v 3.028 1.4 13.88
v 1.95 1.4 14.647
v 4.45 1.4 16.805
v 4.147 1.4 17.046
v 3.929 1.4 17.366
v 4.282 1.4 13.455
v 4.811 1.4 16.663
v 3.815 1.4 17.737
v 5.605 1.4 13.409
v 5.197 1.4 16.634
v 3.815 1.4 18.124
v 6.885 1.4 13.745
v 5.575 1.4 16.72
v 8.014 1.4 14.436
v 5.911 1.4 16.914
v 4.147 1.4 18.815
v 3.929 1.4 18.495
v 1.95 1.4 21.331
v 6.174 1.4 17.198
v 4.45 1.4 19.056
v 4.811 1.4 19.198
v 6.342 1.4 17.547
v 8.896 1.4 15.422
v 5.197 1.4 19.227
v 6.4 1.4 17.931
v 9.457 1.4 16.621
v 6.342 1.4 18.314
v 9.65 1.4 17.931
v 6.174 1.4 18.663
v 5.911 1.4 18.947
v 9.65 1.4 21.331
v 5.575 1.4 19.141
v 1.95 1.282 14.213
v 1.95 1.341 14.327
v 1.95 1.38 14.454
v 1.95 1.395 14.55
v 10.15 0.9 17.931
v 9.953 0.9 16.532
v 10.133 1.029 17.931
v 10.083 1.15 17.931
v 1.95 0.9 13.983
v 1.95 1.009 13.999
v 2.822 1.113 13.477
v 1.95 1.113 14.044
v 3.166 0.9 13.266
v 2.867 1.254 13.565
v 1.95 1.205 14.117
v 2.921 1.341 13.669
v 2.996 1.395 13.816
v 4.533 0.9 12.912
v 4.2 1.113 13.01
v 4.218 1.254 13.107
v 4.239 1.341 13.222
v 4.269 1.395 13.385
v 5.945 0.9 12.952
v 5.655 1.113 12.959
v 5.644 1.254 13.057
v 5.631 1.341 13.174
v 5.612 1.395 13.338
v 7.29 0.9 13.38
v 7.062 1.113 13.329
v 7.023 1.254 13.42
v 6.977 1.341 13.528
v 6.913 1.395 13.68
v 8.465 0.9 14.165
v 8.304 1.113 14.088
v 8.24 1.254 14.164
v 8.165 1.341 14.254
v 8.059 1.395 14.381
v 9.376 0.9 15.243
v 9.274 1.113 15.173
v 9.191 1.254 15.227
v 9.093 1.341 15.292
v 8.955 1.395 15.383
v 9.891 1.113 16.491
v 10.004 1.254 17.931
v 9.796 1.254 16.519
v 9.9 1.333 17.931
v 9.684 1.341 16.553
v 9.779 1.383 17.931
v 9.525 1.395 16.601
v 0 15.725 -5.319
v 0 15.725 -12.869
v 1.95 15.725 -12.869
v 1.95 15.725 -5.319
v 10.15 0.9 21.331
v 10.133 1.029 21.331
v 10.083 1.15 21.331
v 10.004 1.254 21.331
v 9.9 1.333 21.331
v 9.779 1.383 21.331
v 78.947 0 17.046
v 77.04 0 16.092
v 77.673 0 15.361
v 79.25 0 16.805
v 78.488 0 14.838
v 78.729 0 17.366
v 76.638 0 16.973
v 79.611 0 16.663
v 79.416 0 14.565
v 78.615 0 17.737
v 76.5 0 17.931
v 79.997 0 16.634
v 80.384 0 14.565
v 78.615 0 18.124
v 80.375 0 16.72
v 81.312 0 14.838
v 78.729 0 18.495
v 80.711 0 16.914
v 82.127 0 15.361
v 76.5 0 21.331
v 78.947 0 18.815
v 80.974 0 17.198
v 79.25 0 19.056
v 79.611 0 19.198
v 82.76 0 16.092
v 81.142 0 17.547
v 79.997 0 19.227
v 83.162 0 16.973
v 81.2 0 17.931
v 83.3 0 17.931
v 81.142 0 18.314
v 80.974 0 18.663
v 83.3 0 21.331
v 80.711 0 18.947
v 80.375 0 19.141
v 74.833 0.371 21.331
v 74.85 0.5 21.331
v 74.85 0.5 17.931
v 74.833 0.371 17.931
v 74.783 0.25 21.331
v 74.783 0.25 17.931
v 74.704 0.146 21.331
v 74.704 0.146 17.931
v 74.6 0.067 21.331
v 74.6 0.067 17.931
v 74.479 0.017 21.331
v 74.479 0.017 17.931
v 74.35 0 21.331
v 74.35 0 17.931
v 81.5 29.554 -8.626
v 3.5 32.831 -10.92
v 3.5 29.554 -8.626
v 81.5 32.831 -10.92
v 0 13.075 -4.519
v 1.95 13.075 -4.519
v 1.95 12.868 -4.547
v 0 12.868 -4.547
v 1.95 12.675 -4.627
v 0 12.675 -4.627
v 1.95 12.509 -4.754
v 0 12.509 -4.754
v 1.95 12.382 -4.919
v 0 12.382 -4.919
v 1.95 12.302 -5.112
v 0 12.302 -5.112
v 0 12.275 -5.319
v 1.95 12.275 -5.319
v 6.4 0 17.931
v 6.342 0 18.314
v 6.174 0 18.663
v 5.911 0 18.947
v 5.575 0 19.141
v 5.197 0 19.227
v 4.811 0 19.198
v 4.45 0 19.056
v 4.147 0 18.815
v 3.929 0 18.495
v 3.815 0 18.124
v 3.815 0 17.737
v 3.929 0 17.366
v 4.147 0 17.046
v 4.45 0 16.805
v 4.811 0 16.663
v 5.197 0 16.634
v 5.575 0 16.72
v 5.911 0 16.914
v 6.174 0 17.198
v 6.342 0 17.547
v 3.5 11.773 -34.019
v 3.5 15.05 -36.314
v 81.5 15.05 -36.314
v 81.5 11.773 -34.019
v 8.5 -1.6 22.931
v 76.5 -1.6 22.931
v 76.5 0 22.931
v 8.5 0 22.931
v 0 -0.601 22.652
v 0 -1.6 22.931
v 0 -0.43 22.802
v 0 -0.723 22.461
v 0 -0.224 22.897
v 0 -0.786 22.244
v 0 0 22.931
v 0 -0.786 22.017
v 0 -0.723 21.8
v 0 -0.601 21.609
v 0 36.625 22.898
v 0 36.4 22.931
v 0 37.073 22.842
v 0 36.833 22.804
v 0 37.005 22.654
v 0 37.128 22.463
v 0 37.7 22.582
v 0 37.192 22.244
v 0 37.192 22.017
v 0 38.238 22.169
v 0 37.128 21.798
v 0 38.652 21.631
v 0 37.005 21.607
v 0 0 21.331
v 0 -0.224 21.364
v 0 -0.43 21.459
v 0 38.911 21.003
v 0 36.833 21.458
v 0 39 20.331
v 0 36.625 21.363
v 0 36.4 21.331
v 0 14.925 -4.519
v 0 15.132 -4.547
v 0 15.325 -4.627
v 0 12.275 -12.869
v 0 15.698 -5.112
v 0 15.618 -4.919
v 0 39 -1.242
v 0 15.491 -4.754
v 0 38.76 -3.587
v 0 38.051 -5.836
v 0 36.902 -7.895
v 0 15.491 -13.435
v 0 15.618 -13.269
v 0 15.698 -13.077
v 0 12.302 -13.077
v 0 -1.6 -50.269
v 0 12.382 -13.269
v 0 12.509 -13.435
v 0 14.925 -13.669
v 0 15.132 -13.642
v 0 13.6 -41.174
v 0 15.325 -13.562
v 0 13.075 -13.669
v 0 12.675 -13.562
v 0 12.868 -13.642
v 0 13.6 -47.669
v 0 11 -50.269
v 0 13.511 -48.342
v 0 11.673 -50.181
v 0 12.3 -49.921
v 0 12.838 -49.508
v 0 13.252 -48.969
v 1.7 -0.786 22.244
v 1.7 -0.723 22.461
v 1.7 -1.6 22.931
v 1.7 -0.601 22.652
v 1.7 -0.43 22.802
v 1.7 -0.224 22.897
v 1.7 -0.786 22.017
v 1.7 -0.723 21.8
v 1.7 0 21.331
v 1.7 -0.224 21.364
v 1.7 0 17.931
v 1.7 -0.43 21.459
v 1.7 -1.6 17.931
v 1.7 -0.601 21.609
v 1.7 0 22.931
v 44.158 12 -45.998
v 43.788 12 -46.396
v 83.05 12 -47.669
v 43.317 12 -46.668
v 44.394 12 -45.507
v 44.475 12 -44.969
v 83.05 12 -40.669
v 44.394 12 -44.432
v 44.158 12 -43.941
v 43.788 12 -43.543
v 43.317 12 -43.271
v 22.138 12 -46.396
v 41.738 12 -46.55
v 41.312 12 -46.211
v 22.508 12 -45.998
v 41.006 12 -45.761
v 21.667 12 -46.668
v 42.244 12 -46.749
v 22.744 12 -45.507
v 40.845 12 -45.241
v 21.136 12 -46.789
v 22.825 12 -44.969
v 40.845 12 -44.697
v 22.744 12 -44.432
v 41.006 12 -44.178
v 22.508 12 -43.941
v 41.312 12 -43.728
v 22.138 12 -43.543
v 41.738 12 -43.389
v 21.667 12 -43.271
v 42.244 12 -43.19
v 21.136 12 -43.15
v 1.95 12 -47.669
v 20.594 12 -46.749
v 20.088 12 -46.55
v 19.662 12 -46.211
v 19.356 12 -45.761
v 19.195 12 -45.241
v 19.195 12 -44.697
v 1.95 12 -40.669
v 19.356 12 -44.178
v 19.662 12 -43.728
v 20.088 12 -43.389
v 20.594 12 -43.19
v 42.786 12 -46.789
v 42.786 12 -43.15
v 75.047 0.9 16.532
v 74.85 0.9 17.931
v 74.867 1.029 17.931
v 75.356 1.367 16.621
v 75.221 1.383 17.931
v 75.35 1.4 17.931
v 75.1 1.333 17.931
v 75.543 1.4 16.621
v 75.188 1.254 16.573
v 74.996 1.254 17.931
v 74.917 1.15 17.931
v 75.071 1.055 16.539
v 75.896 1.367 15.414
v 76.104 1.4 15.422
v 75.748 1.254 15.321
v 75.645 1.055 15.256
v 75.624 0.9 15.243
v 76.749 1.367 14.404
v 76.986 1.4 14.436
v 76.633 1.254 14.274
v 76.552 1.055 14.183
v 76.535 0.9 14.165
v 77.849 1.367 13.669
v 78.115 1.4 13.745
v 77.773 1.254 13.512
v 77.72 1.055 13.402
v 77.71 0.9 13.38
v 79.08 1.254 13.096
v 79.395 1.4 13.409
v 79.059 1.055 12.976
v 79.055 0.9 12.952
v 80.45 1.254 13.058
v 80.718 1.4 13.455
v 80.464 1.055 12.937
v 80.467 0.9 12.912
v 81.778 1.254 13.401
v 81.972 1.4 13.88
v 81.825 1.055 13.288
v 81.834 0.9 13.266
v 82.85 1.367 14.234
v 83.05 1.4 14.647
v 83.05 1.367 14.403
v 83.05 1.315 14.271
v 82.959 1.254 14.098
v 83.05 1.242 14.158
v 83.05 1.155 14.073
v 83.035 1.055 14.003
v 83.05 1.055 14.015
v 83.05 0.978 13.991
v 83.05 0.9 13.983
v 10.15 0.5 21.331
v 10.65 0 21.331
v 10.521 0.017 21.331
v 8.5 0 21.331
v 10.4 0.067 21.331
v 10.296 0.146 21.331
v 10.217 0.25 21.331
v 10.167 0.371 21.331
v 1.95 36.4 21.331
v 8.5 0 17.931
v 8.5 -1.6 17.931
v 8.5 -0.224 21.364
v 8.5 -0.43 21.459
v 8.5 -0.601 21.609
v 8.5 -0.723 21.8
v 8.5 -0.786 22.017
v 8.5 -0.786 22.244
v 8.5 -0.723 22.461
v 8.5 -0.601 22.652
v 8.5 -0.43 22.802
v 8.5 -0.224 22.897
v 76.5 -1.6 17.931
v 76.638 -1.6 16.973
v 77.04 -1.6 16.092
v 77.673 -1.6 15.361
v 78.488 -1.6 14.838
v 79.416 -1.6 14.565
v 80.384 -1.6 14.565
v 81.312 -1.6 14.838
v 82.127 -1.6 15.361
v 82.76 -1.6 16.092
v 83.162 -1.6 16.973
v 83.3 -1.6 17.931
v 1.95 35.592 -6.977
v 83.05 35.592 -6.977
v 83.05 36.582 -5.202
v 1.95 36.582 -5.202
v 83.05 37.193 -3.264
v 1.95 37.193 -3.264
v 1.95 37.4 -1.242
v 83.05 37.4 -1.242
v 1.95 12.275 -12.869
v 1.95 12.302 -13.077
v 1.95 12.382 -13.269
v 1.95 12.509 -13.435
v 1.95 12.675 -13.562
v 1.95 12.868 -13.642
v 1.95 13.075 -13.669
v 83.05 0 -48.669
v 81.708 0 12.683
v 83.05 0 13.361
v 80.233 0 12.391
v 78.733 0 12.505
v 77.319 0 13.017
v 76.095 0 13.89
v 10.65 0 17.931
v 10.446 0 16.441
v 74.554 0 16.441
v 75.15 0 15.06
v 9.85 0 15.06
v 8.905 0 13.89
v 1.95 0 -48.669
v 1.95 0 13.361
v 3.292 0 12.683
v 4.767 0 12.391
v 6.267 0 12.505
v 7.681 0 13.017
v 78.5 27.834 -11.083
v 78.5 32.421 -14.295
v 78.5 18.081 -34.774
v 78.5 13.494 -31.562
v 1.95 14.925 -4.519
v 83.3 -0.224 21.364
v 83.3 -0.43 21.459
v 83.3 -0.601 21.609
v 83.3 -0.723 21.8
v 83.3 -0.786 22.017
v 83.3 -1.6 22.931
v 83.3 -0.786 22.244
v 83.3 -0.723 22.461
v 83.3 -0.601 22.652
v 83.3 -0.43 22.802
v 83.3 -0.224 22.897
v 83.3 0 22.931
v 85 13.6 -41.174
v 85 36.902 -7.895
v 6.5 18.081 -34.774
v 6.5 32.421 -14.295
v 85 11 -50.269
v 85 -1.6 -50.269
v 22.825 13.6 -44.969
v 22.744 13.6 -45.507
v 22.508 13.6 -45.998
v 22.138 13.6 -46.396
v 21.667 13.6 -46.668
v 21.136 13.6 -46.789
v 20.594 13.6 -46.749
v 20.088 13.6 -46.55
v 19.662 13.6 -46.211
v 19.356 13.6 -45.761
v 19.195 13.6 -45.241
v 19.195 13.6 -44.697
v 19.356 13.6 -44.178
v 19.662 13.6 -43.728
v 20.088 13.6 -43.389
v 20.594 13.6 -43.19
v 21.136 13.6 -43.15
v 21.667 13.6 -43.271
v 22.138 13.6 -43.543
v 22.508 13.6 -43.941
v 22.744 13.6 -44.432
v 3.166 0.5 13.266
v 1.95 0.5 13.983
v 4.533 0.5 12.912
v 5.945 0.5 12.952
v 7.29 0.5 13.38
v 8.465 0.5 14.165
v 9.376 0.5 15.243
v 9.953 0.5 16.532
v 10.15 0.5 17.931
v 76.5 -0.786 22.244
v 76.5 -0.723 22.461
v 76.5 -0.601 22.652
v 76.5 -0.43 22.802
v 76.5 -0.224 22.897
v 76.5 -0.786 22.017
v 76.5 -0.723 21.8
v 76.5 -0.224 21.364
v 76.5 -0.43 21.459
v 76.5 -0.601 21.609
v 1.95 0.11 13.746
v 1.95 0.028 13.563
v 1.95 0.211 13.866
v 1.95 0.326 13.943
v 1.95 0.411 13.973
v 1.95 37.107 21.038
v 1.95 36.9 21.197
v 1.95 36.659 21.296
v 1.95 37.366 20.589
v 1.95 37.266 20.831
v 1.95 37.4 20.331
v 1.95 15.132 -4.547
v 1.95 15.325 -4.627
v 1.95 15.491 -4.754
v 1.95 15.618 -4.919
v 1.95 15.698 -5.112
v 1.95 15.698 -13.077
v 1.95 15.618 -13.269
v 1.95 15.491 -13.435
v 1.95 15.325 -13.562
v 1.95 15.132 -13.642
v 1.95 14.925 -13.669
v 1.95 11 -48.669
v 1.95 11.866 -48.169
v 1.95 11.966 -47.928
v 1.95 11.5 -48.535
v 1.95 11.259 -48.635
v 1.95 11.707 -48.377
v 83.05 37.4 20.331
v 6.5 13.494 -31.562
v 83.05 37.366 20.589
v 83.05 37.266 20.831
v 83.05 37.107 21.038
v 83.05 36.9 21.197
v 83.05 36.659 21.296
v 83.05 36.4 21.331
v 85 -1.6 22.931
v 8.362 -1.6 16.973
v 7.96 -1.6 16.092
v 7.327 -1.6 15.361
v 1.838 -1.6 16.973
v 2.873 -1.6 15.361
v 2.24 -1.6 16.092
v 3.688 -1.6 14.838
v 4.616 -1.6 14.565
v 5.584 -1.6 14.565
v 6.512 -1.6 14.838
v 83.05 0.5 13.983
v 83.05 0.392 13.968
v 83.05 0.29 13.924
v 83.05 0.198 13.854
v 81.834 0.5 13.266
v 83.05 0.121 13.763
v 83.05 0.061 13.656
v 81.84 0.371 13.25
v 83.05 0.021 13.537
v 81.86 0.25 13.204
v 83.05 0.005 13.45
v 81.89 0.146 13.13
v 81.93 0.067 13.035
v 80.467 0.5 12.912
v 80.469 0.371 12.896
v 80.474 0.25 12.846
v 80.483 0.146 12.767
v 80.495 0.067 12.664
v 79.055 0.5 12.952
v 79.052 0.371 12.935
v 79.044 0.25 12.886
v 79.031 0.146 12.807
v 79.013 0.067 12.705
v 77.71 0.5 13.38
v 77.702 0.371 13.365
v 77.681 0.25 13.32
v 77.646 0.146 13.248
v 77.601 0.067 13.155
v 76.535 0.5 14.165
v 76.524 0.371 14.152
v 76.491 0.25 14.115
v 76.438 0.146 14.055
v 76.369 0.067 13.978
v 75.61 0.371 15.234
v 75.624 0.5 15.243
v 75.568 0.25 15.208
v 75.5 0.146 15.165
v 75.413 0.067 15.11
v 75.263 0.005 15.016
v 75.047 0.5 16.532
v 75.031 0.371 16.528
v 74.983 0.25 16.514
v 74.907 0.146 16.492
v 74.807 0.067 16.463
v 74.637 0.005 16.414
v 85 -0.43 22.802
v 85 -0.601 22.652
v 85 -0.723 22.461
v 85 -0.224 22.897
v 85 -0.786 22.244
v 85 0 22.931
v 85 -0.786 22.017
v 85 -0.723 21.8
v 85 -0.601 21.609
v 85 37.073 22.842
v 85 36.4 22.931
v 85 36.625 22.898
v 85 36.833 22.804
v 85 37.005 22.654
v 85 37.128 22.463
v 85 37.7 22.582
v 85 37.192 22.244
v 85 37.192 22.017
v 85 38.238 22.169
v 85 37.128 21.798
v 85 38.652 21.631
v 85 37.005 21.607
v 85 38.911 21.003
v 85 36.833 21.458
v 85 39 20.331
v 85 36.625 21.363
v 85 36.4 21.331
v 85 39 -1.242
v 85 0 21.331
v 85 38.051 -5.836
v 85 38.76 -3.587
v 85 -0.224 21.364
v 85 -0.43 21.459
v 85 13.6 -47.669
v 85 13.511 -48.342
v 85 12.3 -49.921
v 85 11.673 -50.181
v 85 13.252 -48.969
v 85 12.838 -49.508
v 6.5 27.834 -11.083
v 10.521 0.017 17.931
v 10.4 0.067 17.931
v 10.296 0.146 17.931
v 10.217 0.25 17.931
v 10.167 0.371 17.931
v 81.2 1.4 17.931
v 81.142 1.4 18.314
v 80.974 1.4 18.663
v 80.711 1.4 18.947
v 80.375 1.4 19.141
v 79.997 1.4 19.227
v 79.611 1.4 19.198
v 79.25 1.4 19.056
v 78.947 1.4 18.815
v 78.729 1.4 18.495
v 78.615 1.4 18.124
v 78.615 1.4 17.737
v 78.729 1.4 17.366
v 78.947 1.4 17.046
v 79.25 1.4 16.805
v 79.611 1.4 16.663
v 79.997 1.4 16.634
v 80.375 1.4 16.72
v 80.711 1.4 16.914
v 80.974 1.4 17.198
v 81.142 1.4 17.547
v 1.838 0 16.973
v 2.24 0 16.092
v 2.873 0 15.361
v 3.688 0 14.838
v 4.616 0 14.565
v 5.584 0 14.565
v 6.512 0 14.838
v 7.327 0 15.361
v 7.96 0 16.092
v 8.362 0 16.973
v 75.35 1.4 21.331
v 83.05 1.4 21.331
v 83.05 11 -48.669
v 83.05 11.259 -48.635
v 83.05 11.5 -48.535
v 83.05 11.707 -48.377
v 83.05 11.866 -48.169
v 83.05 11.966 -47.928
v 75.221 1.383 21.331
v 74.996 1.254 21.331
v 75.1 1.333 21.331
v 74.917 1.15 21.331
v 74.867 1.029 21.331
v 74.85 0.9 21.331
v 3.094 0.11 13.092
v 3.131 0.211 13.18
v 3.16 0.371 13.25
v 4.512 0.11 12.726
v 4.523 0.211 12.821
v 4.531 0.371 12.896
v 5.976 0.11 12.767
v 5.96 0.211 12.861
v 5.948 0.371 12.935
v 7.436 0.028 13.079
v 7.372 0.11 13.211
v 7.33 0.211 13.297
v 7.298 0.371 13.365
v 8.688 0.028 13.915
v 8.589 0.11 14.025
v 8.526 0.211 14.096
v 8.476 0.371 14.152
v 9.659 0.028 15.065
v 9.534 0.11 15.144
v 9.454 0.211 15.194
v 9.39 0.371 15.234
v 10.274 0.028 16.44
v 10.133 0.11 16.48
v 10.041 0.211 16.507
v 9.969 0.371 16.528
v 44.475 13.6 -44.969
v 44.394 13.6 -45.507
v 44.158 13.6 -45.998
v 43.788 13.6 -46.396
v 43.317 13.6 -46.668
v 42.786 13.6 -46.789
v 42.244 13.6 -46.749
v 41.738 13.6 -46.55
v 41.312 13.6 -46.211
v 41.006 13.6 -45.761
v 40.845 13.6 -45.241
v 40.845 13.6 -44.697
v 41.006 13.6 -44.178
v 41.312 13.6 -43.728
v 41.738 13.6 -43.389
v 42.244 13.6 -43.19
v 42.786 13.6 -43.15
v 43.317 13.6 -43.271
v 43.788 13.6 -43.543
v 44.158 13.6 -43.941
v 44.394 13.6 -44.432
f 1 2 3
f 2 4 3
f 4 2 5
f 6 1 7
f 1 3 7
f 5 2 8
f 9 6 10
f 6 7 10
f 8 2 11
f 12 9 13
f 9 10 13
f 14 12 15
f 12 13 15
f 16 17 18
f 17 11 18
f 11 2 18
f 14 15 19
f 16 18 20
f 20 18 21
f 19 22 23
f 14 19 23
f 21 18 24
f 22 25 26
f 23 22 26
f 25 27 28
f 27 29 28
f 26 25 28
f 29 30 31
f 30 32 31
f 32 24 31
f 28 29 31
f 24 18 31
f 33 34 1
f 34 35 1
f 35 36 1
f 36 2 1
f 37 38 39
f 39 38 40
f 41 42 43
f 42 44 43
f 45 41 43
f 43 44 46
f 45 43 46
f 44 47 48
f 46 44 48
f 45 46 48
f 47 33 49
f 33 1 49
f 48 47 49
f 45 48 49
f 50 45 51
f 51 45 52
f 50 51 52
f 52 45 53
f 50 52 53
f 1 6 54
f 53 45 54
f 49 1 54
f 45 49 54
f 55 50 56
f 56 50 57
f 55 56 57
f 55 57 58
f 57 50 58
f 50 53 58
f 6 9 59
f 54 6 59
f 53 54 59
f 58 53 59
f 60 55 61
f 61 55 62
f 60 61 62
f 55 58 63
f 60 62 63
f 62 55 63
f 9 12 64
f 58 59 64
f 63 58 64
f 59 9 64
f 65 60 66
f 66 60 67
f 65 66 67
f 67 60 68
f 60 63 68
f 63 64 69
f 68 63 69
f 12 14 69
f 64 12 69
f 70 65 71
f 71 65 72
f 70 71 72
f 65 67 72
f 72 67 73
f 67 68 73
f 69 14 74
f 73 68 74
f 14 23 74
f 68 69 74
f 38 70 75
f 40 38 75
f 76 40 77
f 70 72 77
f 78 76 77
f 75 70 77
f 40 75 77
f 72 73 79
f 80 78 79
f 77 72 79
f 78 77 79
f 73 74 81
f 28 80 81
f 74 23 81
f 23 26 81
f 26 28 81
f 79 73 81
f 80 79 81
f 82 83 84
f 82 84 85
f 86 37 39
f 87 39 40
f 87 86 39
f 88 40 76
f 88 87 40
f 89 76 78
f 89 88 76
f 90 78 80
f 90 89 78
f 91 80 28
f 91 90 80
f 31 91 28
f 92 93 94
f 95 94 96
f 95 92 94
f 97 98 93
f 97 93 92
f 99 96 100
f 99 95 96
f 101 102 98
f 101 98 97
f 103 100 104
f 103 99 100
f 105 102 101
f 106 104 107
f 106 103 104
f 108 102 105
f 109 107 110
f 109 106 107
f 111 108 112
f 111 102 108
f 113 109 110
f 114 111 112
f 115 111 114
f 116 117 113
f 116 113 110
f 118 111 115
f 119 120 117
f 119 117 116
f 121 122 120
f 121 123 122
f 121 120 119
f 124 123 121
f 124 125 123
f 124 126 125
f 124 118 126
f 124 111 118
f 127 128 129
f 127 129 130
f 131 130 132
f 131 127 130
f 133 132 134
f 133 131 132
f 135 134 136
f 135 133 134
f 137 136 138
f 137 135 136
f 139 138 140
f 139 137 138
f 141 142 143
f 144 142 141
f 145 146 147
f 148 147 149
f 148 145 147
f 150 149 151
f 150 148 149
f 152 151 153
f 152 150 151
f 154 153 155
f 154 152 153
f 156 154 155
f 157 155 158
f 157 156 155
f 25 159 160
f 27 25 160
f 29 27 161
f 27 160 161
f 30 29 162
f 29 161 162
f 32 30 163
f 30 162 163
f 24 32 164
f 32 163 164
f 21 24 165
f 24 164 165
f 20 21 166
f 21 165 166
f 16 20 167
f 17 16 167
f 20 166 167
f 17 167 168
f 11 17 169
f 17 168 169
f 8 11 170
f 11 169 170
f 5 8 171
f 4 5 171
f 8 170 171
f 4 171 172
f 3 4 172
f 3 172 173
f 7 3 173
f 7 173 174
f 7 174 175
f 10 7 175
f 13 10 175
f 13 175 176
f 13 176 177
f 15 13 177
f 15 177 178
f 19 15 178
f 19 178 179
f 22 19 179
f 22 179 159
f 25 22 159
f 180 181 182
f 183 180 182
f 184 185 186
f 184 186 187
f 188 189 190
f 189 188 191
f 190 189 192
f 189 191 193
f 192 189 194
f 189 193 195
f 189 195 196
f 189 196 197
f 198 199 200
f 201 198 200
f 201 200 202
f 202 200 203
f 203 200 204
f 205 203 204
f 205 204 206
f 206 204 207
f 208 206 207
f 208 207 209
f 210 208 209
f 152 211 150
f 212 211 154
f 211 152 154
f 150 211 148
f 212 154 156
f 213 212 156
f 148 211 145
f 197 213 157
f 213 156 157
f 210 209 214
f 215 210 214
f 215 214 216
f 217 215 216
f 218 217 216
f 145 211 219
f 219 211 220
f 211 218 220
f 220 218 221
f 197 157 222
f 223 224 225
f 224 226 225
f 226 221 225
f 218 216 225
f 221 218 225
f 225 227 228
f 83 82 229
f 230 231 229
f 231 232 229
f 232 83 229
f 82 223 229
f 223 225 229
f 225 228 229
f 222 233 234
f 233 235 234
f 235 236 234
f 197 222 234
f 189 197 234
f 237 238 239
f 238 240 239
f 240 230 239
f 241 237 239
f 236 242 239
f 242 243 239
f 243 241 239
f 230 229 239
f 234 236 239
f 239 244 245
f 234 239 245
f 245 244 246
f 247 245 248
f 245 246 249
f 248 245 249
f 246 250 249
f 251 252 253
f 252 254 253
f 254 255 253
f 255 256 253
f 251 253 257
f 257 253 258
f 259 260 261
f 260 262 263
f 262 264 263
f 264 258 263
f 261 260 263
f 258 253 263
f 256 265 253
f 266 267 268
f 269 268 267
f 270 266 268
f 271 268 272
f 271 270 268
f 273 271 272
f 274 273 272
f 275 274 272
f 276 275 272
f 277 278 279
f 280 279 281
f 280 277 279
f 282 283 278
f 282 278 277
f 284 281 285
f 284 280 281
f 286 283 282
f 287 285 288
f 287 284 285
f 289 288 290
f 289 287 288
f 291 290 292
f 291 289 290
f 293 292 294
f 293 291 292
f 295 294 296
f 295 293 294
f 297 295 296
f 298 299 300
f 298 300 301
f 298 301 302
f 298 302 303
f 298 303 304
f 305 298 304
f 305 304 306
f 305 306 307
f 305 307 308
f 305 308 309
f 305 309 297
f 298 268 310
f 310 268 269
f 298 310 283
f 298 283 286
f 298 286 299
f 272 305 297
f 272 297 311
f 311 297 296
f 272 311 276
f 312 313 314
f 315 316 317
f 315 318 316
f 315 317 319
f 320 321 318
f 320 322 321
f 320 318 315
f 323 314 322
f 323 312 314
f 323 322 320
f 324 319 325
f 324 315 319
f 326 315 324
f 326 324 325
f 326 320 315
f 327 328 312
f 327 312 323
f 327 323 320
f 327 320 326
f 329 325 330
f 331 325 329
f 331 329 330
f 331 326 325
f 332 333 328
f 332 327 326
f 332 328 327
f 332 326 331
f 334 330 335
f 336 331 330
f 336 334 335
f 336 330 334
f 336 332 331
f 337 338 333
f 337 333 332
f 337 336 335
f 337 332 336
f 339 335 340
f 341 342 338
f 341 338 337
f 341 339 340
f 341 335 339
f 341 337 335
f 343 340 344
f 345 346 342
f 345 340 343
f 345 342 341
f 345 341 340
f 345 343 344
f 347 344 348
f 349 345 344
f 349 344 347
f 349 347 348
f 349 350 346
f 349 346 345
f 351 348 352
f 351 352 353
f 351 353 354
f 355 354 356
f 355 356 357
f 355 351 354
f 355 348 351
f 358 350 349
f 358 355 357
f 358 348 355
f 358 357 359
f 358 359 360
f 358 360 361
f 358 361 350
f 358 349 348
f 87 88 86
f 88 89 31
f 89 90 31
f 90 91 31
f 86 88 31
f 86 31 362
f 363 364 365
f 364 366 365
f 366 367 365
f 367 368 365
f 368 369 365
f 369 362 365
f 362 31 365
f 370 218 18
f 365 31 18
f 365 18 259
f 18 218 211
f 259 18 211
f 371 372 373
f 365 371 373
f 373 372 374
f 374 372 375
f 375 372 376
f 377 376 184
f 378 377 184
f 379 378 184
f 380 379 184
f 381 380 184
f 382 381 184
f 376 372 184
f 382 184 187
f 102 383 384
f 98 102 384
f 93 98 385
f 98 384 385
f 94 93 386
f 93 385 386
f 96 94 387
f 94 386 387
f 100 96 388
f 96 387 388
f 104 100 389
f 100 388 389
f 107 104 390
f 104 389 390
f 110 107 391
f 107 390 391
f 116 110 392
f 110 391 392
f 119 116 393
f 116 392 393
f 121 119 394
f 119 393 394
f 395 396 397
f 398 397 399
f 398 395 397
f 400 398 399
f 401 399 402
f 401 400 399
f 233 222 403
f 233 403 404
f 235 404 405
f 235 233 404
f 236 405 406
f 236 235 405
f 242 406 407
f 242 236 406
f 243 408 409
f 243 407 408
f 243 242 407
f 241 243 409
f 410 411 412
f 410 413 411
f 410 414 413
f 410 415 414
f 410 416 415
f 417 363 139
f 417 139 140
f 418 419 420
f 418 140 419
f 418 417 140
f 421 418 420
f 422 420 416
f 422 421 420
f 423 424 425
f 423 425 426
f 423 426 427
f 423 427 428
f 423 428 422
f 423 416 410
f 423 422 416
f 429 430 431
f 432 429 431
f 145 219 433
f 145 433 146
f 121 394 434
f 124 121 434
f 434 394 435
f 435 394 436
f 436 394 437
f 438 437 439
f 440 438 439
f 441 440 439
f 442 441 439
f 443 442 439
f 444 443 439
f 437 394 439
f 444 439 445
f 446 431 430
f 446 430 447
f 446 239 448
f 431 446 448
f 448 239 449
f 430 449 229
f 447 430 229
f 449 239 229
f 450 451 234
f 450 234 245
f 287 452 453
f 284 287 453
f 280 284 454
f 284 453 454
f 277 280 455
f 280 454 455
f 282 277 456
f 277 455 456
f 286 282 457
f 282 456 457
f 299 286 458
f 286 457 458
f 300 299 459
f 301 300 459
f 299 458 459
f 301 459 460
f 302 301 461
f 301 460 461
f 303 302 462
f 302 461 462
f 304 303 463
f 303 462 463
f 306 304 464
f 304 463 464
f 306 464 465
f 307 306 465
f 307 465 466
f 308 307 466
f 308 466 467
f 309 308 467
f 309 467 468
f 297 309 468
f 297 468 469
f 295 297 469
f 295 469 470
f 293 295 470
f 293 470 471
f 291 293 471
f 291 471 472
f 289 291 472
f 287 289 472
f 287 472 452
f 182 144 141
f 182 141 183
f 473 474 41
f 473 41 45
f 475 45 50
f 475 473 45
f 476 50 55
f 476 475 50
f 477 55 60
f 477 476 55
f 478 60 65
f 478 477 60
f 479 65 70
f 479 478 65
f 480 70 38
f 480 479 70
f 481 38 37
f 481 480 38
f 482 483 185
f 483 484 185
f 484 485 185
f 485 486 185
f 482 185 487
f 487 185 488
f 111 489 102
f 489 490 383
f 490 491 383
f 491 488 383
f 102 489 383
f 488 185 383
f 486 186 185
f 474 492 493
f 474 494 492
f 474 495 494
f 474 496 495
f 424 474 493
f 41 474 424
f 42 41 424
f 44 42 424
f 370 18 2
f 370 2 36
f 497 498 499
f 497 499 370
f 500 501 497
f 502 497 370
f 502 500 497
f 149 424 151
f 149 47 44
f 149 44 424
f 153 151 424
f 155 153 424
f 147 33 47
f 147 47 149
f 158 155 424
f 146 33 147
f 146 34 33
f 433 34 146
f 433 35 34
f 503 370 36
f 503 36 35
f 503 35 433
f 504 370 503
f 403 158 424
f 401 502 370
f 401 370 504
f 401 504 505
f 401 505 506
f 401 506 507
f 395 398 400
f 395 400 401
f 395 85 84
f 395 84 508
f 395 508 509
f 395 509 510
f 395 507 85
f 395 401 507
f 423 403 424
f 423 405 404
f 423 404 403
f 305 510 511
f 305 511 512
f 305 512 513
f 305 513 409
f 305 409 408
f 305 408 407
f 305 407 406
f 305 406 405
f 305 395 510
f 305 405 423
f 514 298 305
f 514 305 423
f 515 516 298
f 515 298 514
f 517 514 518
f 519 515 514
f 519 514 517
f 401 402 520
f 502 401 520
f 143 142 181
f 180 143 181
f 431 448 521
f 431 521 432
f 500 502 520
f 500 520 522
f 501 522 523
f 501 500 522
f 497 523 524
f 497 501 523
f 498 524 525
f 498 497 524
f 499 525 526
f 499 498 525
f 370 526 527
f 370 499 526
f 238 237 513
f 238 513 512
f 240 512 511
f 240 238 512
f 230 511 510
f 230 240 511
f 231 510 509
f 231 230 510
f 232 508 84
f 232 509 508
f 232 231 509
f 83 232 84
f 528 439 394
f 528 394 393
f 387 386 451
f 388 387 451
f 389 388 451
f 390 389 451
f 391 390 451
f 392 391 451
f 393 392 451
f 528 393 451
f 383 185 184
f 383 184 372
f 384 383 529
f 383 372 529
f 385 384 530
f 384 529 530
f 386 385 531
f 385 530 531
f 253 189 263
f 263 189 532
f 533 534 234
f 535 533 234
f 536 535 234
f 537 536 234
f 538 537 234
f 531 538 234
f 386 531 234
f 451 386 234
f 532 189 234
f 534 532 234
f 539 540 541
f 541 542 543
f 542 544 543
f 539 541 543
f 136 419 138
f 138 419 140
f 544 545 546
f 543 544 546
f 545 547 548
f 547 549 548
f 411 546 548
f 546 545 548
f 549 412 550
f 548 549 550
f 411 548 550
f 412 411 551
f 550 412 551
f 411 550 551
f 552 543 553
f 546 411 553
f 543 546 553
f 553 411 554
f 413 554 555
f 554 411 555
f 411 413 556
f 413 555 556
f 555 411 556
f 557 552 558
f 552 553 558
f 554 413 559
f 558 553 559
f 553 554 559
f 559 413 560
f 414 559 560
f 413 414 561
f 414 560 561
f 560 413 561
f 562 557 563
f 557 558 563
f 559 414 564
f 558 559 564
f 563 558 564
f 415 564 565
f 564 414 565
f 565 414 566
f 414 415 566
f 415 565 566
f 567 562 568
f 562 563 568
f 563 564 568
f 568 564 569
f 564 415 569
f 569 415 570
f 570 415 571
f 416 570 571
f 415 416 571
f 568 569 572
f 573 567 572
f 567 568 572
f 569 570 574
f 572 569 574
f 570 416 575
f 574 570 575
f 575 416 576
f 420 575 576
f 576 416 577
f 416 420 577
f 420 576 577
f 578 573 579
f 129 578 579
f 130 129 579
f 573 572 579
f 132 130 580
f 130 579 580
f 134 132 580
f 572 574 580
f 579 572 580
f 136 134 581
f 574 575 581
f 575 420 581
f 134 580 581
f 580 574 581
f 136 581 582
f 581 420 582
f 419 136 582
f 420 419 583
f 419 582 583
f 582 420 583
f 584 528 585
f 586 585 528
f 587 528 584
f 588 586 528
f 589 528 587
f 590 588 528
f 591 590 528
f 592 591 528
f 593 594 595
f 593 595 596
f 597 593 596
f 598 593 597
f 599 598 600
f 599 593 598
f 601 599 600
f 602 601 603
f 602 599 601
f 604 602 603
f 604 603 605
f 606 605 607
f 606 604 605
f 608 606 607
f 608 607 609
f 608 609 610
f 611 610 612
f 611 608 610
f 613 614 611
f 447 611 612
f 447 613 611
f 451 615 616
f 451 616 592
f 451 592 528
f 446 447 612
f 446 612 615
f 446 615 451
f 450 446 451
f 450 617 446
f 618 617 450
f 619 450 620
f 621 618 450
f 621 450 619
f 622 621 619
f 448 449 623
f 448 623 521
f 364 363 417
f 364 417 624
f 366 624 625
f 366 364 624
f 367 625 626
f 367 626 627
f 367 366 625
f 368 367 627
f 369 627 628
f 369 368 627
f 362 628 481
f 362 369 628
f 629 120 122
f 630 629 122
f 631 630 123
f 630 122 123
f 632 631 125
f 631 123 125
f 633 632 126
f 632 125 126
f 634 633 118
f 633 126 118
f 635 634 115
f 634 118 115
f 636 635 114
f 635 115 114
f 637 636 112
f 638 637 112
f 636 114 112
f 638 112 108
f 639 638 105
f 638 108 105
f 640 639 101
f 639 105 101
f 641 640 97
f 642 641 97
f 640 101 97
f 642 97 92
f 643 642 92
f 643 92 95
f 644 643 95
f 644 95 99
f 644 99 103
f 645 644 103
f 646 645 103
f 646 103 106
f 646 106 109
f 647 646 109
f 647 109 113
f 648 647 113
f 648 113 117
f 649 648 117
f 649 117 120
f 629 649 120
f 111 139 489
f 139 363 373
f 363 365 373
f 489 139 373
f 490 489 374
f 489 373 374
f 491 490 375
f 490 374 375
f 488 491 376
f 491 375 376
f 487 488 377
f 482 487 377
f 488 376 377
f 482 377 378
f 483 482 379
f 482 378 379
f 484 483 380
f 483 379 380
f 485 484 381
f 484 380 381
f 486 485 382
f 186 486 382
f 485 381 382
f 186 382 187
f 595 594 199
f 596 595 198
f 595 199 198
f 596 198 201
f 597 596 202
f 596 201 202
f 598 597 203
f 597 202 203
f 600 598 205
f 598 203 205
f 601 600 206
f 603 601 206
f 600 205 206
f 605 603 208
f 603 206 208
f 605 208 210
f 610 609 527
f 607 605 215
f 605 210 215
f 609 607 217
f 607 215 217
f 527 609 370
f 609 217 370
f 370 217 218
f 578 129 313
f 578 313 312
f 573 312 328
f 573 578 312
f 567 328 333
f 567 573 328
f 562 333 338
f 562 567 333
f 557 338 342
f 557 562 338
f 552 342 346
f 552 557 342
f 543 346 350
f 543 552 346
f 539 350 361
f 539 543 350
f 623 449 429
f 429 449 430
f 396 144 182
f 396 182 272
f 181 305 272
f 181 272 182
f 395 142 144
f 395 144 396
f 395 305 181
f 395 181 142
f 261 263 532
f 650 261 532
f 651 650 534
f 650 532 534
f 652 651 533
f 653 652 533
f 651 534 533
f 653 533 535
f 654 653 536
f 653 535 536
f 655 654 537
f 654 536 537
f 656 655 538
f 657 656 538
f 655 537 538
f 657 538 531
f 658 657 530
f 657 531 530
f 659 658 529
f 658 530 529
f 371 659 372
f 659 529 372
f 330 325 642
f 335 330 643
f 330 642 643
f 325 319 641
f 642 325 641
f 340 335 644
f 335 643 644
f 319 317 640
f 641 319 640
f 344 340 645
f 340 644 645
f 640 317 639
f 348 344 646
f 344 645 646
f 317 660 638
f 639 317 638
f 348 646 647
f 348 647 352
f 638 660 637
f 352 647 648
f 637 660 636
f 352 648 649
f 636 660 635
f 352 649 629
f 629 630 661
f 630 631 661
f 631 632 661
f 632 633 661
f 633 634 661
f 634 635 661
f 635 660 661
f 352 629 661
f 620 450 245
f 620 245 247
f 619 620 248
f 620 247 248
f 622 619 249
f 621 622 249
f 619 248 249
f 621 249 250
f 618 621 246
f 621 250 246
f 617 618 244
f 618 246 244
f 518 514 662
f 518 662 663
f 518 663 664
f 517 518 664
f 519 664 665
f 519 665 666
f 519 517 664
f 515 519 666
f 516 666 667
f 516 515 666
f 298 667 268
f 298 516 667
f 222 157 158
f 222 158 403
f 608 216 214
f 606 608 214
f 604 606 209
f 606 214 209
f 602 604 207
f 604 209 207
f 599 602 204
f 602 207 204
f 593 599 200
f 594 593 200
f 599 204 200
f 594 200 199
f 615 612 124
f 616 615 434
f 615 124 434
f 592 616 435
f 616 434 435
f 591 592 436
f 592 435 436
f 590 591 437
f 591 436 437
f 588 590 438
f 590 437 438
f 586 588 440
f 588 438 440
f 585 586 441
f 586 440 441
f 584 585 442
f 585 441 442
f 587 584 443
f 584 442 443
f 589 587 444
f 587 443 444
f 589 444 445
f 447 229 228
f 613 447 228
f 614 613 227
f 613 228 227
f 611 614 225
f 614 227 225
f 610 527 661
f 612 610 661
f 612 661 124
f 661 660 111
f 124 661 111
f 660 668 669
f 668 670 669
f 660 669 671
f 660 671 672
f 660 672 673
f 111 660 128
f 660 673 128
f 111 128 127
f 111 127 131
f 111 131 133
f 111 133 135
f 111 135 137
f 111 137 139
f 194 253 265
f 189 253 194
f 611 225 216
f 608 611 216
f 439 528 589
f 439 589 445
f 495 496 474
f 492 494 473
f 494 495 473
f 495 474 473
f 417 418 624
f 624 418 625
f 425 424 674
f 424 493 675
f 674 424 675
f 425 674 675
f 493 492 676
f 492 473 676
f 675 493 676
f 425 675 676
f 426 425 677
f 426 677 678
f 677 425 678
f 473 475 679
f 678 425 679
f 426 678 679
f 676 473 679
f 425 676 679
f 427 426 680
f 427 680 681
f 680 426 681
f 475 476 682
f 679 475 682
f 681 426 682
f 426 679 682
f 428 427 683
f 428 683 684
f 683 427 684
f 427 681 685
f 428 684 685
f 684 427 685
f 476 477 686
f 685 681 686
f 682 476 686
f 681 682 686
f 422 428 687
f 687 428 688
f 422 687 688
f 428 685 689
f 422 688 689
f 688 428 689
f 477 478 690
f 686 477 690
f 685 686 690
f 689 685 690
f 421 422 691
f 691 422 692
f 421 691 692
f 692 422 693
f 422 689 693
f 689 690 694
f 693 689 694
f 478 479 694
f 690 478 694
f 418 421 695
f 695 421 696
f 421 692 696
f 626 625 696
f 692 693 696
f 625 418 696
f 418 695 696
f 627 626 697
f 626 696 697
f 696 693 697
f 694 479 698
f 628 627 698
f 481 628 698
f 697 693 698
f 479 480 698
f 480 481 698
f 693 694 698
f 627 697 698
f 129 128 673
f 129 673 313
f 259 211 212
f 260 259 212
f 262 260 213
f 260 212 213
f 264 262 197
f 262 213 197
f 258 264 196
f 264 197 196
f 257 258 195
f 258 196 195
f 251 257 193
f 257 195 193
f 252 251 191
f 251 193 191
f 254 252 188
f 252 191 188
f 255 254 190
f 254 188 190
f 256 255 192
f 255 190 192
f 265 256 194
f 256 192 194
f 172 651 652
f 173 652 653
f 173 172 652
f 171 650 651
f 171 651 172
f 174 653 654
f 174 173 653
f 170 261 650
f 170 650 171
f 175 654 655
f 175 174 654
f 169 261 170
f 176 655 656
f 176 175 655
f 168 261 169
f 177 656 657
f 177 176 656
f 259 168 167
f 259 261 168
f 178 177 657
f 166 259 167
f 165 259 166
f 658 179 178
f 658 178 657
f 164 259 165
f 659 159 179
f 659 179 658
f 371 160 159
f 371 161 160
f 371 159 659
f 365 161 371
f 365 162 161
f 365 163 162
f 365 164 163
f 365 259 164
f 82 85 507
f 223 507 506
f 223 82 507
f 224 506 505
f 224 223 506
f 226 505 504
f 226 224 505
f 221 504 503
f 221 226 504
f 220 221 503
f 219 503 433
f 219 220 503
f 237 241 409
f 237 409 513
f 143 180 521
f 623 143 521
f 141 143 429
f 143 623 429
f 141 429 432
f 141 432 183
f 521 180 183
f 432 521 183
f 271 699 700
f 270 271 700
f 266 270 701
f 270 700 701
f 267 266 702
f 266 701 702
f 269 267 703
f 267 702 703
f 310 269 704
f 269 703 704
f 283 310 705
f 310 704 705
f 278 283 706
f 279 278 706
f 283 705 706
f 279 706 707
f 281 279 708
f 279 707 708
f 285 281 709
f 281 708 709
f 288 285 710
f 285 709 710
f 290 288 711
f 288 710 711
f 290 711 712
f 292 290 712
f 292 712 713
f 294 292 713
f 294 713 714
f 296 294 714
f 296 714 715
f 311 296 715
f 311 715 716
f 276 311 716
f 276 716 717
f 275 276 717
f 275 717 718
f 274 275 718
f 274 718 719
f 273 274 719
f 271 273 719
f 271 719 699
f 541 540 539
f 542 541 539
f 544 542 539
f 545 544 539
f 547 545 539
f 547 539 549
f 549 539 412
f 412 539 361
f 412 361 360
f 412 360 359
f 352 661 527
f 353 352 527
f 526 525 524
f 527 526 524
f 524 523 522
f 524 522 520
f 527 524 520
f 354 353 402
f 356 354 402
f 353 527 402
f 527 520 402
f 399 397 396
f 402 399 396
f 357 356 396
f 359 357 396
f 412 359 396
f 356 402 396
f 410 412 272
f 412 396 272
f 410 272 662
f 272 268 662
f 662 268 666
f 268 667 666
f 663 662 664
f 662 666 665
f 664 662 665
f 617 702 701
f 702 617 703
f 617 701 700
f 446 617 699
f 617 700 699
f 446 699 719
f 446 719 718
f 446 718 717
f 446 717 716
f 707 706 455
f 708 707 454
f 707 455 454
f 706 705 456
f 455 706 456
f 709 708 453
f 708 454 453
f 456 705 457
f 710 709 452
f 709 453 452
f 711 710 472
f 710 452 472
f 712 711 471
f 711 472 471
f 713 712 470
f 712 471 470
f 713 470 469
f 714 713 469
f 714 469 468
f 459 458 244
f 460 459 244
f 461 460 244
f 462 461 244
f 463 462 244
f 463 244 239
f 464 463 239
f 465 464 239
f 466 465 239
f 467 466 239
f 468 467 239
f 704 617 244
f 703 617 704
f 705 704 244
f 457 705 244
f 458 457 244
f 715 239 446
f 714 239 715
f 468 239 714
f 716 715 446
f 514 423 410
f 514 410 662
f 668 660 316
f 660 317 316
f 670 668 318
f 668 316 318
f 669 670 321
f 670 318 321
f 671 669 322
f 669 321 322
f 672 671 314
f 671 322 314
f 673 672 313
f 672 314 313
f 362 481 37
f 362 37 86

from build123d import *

# Parameters (mm, degrees)
BOSS_EXTRUDE1_DEPTH = 85
CUT_EXTRUDE1_START  = 1.95
CUT_EXTRUDE1_DEPTH  = 81.1
CUT_EXTRUDE5_REACH  = 51.22
SKETCH5_W           = 72
SKETCH5_H           = 25
SKETCH5_3_W         = 78
SKETCH5_3_H         = 31
SKETCH5_3_W_2       = 72
SKETCH5_3_H_2       = 25
BOSS_EXTRUDE3_DEPTH = 5.6
SKETCH6_R           = 1.825
CUT_EXTRUDE6_DEPTH  = 13.6
CUT_EXTRUDE7_REACH  = 87
SKETCH12_R          = 1.5
CUT_EXTRUDE10_DEPTH = 1.6
SKETCH12_5_R        = 1.5
SKETCH12_5_R_2      = 1.3
BOSS_EXTRUDE7_DEPTH = 3
SKETCH12_6_R        = 1.5
SKETCH12_6_R_2      = 1.3
CUT_EXTRUDE11_DEPTH = 1.6
CUT_EXTRUDE8_REACH  = 87
FILLET2_R           = 0.5


with BuildPart() as part:
    # Sketch1 → Boss-Extrude1 (new body)
    with BuildSketch(Plane(origin=(0, 0, 0), x_dir=(0, 0, -1), z_dir=(1, 0, 0))):
        with BuildLine():
            Line((-22.930528586, 36.4), (-22.930528586, -1.6))
            Line((-22.930528586, -1.6), (50.269471414, -1.6))
            Line((50.269471414, -1.6), (50.269471414, 11))
            ThreePointArc((50.269471414, 11), (49.507949045, 12.838477631), (47.669471414, 13.6))
            Line((47.669471414, 13.6), (41.173949476, 13.6))
            Line((41.173949476, 13.6), (7.895010815, 36.902163714))
            ThreePointArc((7.895010815, 36.902163714), (4.729711428, 38.463116629), (1.241524153, 39))
            Line((1.241524153, 39), (-20.330528586, 39))
            ThreePointArc((-20.330528586, 39), (-22.169006218, 38.238477631), (-22.930528586, 36.4))
        make_face()
    extrude(amount=BOSS_EXTRUDE1_DEPTH)

    # Sketch1_3 → Cut-Extrude1 (cut)
    with BuildSketch(Plane(origin=(0, 0, 0), x_dir=(0, 0, -1), z_dir=(1, 0, 0)).offset(CUT_EXTRUDE1_START)):
        with BuildLine():
            Line((48.669471414, 0), (48.669471414, 11))
            ThreePointArc((48.669471414, 11), (48.376578195, 11.707106781), (47.669471414, 12))
            Line((47.669471414, 12), (40.669471414, 12))
            Line((40.669471414, 12), (6.977288517, 35.591520443))
            ThreePointArc((6.977288517, 35.591520443), (4.248582149, 36.937169507), (1.241524153, 37.4))
            Line((1.241524153, 37.4), (-20.330528586, 37.4))
            ThreePointArc((-20.330528586, 37.4), (-21.037635368, 37.107106781), (-21.330528586, 36.4))
            Line((-21.330528586, 36.4), (-21.330528586, 0))
            Line((-21.330528586, 0), (48.669471414, 0))
        make_face()
    extrude(amount=CUT_EXTRUDE1_DEPTH, mode=Mode.SUBTRACT)

    # Sketch5 → Cut-Extrude5 (cut, up to next)
    with BuildSketch(Plane(origin=(0, 28.47116522, -19.935724509), x_dir=(1, 0, 0), z_dir=(0, 0.819152044, -0.573576436)), mode=Mode.PRIVATE) as cut_extrude5_sk1:
        with Locations((42.5, 5.614044021)):
            Rectangle(SKETCH5_W, SKETCH5_H)
    cut_extrude5_tool1 = extrude(cut_extrude5_sk1.sketch, amount=-CUT_EXTRUDE5_REACH, mode=Mode.PRIVATE) & part.part
    add(cut_extrude5_tool1.solids().sort_by_distance((42.5, 25.251082, -24.53448))[0], mode=Mode.SUBTRACT)

    # Sketch5_3 → Boss-Extrude3 (add)
    with BuildSketch(Plane(origin=(0, 28.47116522, -19.935724509), x_dir=(1, 0, 0), z_dir=(0, 0.819152044, -0.573576436))):
        with Locations((42.5, 5.614044021)):
            Rectangle(SKETCH5_3_W, SKETCH5_3_H)
        with Locations((42.5, 5.614044021)):
            Rectangle(SKETCH5_3_W_2, SKETCH5_3_H_2, mode=Mode.SUBTRACT)
    extrude(amount=-BOSS_EXTRUDE3_DEPTH)

    # Sketch6 → Cut-Extrude6 (cut)
    with BuildSketch(Plane(origin=(0, 13.6, 0), x_dir=(1, 0, 0), z_dir=(0, 1, 0))):
        with Locations((21, 44.969471414)):
            Circle(SKETCH6_R)
        with Locations((42.65, 44.969471414)):
            Circle(SKETCH6_R)
    extrude(amount=-CUT_EXTRUDE6_DEPTH, mode=Mode.SUBTRACT)

    # Sketch7 → Cut-Extrude7 (cut, up to next)
    with BuildSketch(Plane.ZY, mode=Mode.PRIVATE) as cut_extrude7_sk1:
        with BuildLine():
            Line((-12.869471414, 15.725), (-5.319471414, 15.725))
            ThreePointArc((-5.319471414, 15.725), (-4.753785989, 15.490685425), (-4.519471414, 14.925))
            Line((-4.519471414, 14.925), (-4.519471414, 13.075))
            ThreePointArc((-4.519471414, 13.075), (-4.753785989, 12.509314575), (-5.319471414, 12.275))
            Line((-5.319471414, 12.275), (-12.869471414, 12.275))
            ThreePointArc((-12.869471414, 12.275), (-13.435156838, 12.509314575), (-13.669471414, 13.075))
            Line((-13.669471414, 13.075), (-13.669471414, 14.925))
            ThreePointArc((-13.669471414, 14.925), (-13.435156838, 15.490685425), (-12.869471414, 15.725))
        make_face()
    cut_extrude7_tool1 = extrude(cut_extrude7_sk1.sketch, amount=-CUT_EXTRUDE7_REACH, mode=Mode.PRIVATE) & part.part
    add(cut_extrude7_tool1.solids().sort_by_distance((0, 14, -9.094471))[0], mode=Mode.SUBTRACT)

    # Sketch12 → Cut-Extrude10 (cut)
    with BuildSketch(Plane.XZ.offset(1.6)):
        with Locations((79.9, 17.930528586)):
            Circle(SKETCH12_R)
        with Locations((5.1, 17.930528586)):
            Circle(SKETCH12_R)
    extrude(amount=-CUT_EXTRUDE10_DEPTH, mode=Mode.SUBTRACT)

    # Sketch12_5 → Boss-Extrude7 (add)
    with BuildSketch(Plane.XZ.offset(1.6)):
        with BuildLine():
            ThreePointArc((83.3, 17.930528586), (79.9, 14.530528586), (76.5, 17.930528586))
            Line((76.5, 17.930528586), (76.5, 22.930528586))
            Line((76.5, 22.930528586), (74.85, 22.930528586))
            Line((74.85, 22.930528586), (74.85, 17.930528586))
            ThreePointArc((74.85, 17.930528586), (79.9, 12.880528586), (84.95, 17.930528586))
            Line((84.95, 17.930528586), (84.95, 22.930528586))
            Line((84.95, 22.930528586), (83.3, 22.930528586))
            Line((83.3, 22.930528586), (83.3, 17.930528586))
        make_face()
        with BuildLine():
            Line((76.5, 22.930528586), (76.5, 17.930528586))
            ThreePointArc((76.5, 17.930528586), (79.9, 14.530528586), (83.3, 17.930528586))
            Line((83.3, 17.930528586), (83.3, 22.930528586))
            Line((83.3, 22.930528586), (76.5, 22.930528586))
        make_face()
        with Locations((79.9, 17.930528586)):
            Circle(SKETCH12_5_R, mode=Mode.SUBTRACT)
        with Locations((79.9, 17.930528586)):
            Circle(SKETCH12_5_R)
        with Locations((79.9, 17.930528586)):
            Circle(SKETCH12_5_R_2, mode=Mode.SUBTRACT)
        with BuildLine():
            Line((10.15, 17.930528586), (10.15, 22.930528586))
            Line((10.15, 22.930528586), (8.5, 22.930528586))
            Line((8.5, 22.930528586), (8.5, 17.930528586))
            ThreePointArc((8.5, 17.930528586), (5.1, 14.530528586), (1.7, 17.930528586))
            Line((1.7, 17.930528586), (1.7, 22.930528586))
            Line((1.7, 22.930528586), (0.05, 22.930528586))
            Line((0.05, 22.930528586), (0.05, 17.930528586))
            ThreePointArc((0.05, 17.930528586), (5.1, 12.880528586), (10.15, 17.930528586))
        make_face()
        with BuildLine():
            Line((8.5, 17.930528586), (8.5, 22.930528586))
            Line((8.5, 22.930528586), (1.7, 22.930528586))
            Line((1.7, 22.930528586), (1.7, 17.930528586))
            ThreePointArc((1.7, 17.930528586), (5.1, 14.530528586), (8.5, 17.930528586))
        make_face()
        with Locations((5.1, 17.930528586)):
            Circle(SKETCH12_5_R, mode=Mode.SUBTRACT)
        with Locations((5.1, 17.930528586)):
            Circle(SKETCH12_5_R)
        with Locations((5.1, 17.930528586)):
            Circle(SKETCH12_5_R_2, mode=Mode.SUBTRACT)
    extrude(amount=-BOSS_EXTRUDE7_DEPTH)

    # Sketch12_6 → Cut-Extrude11 (cut)
    with BuildSketch(Plane.XZ.offset(1.6)):
        with BuildLine():
            Line((8.5, 17.930528586), (8.5, 22.930528586))
            Line((8.5, 22.930528586), (1.7, 22.930528586))
            Line((1.7, 22.930528586), (1.7, 17.930528586))
            ThreePointArc((1.7, 17.930528586), (5.1, 14.530528586), (8.5, 17.930528586))
        make_face()
        with Locations((5.1, 17.930528586)):
            Circle(SKETCH12_6_R, mode=Mode.SUBTRACT)
        with BuildLine():
            Line((76.5, 22.930528586), (76.5, 17.930528586))
            ThreePointArc((76.5, 17.930528586), (79.9, 14.530528586), (83.3, 17.930528586))
            Line((83.3, 17.930528586), (83.3, 22.930528586))
            Line((83.3, 22.930528586), (76.5, 22.930528586))
        make_face()
        with Locations((79.9, 17.930528586)):
            Circle(SKETCH12_6_R, mode=Mode.SUBTRACT)
        with Locations((79.9, 17.930528586)):
            Circle(SKETCH12_6_R)
        with Locations((79.9, 17.930528586)):
            Circle(SKETCH12_6_R_2, mode=Mode.SUBTRACT)
        with Locations((5.1, 17.930528586)):
            Circle(SKETCH12_6_R)
        with Locations((5.1, 17.930528586)):
            Circle(SKETCH12_6_R_2, mode=Mode.SUBTRACT)
    extrude(amount=-CUT_EXTRUDE11_DEPTH, mode=Mode.SUBTRACT)

    # Sketch9 → Cut-Extrude8 (cut, up to next)
    with BuildSketch(Plane(origin=(0, 0, 0), x_dir=(0, 0, -1), z_dir=(1, 0, 0)), mode=Mode.PRIVATE) as cut_extrude8_sk1:
        with BuildLine():
            Line((-21.330528586, 35.411275227), (-21.330528586, 0))
            ThreePointArc((-21.330528586, 0), (-22.1361662, -0.794362387), (-22.930528586, 0.011275227))
            Line((-22.930528586, 0.011275227), (-22.930528586, 36.4))
            ThreePointArc((-22.930528586, 36.4), (-22.130528586, 37.2), (-21.330528586, 36.4))
            Line((-21.330528586, 36.4), (-21.330528586, 35.411275227))
        make_face()
    cut_extrude8_tool1 = extrude(cut_extrude8_sk1.sketch, amount=CUT_EXTRUDE8_REACH, mode=Mode.PRIVATE) & part.part
    add(cut_extrude8_tool1.solids().sort_by_distance((0, 18.202803, 22.130529))[0], mode=Mode.SUBTRACT)

    # Fillet2
    fillet2_edges = [part.edges().sort_by_distance(p)[0] for p in [
        (74.85, 0, 19.630528586),
        (77.709680389, 0, 13.380253869),
        (77.709680389, 1.4, 13.380253869),
        (74.85, 1.4, 19.630528586),
        (7.290319611, 0, 13.380253869),
        (10.15, 1.4, 19.630528586),
        (10.15, 0, 19.630528586),
        (7.290319611, 1.4, 13.380253869),
    ]]
    fillet(fillet2_edges, radius=FILLET2_R)


solid = part.part
